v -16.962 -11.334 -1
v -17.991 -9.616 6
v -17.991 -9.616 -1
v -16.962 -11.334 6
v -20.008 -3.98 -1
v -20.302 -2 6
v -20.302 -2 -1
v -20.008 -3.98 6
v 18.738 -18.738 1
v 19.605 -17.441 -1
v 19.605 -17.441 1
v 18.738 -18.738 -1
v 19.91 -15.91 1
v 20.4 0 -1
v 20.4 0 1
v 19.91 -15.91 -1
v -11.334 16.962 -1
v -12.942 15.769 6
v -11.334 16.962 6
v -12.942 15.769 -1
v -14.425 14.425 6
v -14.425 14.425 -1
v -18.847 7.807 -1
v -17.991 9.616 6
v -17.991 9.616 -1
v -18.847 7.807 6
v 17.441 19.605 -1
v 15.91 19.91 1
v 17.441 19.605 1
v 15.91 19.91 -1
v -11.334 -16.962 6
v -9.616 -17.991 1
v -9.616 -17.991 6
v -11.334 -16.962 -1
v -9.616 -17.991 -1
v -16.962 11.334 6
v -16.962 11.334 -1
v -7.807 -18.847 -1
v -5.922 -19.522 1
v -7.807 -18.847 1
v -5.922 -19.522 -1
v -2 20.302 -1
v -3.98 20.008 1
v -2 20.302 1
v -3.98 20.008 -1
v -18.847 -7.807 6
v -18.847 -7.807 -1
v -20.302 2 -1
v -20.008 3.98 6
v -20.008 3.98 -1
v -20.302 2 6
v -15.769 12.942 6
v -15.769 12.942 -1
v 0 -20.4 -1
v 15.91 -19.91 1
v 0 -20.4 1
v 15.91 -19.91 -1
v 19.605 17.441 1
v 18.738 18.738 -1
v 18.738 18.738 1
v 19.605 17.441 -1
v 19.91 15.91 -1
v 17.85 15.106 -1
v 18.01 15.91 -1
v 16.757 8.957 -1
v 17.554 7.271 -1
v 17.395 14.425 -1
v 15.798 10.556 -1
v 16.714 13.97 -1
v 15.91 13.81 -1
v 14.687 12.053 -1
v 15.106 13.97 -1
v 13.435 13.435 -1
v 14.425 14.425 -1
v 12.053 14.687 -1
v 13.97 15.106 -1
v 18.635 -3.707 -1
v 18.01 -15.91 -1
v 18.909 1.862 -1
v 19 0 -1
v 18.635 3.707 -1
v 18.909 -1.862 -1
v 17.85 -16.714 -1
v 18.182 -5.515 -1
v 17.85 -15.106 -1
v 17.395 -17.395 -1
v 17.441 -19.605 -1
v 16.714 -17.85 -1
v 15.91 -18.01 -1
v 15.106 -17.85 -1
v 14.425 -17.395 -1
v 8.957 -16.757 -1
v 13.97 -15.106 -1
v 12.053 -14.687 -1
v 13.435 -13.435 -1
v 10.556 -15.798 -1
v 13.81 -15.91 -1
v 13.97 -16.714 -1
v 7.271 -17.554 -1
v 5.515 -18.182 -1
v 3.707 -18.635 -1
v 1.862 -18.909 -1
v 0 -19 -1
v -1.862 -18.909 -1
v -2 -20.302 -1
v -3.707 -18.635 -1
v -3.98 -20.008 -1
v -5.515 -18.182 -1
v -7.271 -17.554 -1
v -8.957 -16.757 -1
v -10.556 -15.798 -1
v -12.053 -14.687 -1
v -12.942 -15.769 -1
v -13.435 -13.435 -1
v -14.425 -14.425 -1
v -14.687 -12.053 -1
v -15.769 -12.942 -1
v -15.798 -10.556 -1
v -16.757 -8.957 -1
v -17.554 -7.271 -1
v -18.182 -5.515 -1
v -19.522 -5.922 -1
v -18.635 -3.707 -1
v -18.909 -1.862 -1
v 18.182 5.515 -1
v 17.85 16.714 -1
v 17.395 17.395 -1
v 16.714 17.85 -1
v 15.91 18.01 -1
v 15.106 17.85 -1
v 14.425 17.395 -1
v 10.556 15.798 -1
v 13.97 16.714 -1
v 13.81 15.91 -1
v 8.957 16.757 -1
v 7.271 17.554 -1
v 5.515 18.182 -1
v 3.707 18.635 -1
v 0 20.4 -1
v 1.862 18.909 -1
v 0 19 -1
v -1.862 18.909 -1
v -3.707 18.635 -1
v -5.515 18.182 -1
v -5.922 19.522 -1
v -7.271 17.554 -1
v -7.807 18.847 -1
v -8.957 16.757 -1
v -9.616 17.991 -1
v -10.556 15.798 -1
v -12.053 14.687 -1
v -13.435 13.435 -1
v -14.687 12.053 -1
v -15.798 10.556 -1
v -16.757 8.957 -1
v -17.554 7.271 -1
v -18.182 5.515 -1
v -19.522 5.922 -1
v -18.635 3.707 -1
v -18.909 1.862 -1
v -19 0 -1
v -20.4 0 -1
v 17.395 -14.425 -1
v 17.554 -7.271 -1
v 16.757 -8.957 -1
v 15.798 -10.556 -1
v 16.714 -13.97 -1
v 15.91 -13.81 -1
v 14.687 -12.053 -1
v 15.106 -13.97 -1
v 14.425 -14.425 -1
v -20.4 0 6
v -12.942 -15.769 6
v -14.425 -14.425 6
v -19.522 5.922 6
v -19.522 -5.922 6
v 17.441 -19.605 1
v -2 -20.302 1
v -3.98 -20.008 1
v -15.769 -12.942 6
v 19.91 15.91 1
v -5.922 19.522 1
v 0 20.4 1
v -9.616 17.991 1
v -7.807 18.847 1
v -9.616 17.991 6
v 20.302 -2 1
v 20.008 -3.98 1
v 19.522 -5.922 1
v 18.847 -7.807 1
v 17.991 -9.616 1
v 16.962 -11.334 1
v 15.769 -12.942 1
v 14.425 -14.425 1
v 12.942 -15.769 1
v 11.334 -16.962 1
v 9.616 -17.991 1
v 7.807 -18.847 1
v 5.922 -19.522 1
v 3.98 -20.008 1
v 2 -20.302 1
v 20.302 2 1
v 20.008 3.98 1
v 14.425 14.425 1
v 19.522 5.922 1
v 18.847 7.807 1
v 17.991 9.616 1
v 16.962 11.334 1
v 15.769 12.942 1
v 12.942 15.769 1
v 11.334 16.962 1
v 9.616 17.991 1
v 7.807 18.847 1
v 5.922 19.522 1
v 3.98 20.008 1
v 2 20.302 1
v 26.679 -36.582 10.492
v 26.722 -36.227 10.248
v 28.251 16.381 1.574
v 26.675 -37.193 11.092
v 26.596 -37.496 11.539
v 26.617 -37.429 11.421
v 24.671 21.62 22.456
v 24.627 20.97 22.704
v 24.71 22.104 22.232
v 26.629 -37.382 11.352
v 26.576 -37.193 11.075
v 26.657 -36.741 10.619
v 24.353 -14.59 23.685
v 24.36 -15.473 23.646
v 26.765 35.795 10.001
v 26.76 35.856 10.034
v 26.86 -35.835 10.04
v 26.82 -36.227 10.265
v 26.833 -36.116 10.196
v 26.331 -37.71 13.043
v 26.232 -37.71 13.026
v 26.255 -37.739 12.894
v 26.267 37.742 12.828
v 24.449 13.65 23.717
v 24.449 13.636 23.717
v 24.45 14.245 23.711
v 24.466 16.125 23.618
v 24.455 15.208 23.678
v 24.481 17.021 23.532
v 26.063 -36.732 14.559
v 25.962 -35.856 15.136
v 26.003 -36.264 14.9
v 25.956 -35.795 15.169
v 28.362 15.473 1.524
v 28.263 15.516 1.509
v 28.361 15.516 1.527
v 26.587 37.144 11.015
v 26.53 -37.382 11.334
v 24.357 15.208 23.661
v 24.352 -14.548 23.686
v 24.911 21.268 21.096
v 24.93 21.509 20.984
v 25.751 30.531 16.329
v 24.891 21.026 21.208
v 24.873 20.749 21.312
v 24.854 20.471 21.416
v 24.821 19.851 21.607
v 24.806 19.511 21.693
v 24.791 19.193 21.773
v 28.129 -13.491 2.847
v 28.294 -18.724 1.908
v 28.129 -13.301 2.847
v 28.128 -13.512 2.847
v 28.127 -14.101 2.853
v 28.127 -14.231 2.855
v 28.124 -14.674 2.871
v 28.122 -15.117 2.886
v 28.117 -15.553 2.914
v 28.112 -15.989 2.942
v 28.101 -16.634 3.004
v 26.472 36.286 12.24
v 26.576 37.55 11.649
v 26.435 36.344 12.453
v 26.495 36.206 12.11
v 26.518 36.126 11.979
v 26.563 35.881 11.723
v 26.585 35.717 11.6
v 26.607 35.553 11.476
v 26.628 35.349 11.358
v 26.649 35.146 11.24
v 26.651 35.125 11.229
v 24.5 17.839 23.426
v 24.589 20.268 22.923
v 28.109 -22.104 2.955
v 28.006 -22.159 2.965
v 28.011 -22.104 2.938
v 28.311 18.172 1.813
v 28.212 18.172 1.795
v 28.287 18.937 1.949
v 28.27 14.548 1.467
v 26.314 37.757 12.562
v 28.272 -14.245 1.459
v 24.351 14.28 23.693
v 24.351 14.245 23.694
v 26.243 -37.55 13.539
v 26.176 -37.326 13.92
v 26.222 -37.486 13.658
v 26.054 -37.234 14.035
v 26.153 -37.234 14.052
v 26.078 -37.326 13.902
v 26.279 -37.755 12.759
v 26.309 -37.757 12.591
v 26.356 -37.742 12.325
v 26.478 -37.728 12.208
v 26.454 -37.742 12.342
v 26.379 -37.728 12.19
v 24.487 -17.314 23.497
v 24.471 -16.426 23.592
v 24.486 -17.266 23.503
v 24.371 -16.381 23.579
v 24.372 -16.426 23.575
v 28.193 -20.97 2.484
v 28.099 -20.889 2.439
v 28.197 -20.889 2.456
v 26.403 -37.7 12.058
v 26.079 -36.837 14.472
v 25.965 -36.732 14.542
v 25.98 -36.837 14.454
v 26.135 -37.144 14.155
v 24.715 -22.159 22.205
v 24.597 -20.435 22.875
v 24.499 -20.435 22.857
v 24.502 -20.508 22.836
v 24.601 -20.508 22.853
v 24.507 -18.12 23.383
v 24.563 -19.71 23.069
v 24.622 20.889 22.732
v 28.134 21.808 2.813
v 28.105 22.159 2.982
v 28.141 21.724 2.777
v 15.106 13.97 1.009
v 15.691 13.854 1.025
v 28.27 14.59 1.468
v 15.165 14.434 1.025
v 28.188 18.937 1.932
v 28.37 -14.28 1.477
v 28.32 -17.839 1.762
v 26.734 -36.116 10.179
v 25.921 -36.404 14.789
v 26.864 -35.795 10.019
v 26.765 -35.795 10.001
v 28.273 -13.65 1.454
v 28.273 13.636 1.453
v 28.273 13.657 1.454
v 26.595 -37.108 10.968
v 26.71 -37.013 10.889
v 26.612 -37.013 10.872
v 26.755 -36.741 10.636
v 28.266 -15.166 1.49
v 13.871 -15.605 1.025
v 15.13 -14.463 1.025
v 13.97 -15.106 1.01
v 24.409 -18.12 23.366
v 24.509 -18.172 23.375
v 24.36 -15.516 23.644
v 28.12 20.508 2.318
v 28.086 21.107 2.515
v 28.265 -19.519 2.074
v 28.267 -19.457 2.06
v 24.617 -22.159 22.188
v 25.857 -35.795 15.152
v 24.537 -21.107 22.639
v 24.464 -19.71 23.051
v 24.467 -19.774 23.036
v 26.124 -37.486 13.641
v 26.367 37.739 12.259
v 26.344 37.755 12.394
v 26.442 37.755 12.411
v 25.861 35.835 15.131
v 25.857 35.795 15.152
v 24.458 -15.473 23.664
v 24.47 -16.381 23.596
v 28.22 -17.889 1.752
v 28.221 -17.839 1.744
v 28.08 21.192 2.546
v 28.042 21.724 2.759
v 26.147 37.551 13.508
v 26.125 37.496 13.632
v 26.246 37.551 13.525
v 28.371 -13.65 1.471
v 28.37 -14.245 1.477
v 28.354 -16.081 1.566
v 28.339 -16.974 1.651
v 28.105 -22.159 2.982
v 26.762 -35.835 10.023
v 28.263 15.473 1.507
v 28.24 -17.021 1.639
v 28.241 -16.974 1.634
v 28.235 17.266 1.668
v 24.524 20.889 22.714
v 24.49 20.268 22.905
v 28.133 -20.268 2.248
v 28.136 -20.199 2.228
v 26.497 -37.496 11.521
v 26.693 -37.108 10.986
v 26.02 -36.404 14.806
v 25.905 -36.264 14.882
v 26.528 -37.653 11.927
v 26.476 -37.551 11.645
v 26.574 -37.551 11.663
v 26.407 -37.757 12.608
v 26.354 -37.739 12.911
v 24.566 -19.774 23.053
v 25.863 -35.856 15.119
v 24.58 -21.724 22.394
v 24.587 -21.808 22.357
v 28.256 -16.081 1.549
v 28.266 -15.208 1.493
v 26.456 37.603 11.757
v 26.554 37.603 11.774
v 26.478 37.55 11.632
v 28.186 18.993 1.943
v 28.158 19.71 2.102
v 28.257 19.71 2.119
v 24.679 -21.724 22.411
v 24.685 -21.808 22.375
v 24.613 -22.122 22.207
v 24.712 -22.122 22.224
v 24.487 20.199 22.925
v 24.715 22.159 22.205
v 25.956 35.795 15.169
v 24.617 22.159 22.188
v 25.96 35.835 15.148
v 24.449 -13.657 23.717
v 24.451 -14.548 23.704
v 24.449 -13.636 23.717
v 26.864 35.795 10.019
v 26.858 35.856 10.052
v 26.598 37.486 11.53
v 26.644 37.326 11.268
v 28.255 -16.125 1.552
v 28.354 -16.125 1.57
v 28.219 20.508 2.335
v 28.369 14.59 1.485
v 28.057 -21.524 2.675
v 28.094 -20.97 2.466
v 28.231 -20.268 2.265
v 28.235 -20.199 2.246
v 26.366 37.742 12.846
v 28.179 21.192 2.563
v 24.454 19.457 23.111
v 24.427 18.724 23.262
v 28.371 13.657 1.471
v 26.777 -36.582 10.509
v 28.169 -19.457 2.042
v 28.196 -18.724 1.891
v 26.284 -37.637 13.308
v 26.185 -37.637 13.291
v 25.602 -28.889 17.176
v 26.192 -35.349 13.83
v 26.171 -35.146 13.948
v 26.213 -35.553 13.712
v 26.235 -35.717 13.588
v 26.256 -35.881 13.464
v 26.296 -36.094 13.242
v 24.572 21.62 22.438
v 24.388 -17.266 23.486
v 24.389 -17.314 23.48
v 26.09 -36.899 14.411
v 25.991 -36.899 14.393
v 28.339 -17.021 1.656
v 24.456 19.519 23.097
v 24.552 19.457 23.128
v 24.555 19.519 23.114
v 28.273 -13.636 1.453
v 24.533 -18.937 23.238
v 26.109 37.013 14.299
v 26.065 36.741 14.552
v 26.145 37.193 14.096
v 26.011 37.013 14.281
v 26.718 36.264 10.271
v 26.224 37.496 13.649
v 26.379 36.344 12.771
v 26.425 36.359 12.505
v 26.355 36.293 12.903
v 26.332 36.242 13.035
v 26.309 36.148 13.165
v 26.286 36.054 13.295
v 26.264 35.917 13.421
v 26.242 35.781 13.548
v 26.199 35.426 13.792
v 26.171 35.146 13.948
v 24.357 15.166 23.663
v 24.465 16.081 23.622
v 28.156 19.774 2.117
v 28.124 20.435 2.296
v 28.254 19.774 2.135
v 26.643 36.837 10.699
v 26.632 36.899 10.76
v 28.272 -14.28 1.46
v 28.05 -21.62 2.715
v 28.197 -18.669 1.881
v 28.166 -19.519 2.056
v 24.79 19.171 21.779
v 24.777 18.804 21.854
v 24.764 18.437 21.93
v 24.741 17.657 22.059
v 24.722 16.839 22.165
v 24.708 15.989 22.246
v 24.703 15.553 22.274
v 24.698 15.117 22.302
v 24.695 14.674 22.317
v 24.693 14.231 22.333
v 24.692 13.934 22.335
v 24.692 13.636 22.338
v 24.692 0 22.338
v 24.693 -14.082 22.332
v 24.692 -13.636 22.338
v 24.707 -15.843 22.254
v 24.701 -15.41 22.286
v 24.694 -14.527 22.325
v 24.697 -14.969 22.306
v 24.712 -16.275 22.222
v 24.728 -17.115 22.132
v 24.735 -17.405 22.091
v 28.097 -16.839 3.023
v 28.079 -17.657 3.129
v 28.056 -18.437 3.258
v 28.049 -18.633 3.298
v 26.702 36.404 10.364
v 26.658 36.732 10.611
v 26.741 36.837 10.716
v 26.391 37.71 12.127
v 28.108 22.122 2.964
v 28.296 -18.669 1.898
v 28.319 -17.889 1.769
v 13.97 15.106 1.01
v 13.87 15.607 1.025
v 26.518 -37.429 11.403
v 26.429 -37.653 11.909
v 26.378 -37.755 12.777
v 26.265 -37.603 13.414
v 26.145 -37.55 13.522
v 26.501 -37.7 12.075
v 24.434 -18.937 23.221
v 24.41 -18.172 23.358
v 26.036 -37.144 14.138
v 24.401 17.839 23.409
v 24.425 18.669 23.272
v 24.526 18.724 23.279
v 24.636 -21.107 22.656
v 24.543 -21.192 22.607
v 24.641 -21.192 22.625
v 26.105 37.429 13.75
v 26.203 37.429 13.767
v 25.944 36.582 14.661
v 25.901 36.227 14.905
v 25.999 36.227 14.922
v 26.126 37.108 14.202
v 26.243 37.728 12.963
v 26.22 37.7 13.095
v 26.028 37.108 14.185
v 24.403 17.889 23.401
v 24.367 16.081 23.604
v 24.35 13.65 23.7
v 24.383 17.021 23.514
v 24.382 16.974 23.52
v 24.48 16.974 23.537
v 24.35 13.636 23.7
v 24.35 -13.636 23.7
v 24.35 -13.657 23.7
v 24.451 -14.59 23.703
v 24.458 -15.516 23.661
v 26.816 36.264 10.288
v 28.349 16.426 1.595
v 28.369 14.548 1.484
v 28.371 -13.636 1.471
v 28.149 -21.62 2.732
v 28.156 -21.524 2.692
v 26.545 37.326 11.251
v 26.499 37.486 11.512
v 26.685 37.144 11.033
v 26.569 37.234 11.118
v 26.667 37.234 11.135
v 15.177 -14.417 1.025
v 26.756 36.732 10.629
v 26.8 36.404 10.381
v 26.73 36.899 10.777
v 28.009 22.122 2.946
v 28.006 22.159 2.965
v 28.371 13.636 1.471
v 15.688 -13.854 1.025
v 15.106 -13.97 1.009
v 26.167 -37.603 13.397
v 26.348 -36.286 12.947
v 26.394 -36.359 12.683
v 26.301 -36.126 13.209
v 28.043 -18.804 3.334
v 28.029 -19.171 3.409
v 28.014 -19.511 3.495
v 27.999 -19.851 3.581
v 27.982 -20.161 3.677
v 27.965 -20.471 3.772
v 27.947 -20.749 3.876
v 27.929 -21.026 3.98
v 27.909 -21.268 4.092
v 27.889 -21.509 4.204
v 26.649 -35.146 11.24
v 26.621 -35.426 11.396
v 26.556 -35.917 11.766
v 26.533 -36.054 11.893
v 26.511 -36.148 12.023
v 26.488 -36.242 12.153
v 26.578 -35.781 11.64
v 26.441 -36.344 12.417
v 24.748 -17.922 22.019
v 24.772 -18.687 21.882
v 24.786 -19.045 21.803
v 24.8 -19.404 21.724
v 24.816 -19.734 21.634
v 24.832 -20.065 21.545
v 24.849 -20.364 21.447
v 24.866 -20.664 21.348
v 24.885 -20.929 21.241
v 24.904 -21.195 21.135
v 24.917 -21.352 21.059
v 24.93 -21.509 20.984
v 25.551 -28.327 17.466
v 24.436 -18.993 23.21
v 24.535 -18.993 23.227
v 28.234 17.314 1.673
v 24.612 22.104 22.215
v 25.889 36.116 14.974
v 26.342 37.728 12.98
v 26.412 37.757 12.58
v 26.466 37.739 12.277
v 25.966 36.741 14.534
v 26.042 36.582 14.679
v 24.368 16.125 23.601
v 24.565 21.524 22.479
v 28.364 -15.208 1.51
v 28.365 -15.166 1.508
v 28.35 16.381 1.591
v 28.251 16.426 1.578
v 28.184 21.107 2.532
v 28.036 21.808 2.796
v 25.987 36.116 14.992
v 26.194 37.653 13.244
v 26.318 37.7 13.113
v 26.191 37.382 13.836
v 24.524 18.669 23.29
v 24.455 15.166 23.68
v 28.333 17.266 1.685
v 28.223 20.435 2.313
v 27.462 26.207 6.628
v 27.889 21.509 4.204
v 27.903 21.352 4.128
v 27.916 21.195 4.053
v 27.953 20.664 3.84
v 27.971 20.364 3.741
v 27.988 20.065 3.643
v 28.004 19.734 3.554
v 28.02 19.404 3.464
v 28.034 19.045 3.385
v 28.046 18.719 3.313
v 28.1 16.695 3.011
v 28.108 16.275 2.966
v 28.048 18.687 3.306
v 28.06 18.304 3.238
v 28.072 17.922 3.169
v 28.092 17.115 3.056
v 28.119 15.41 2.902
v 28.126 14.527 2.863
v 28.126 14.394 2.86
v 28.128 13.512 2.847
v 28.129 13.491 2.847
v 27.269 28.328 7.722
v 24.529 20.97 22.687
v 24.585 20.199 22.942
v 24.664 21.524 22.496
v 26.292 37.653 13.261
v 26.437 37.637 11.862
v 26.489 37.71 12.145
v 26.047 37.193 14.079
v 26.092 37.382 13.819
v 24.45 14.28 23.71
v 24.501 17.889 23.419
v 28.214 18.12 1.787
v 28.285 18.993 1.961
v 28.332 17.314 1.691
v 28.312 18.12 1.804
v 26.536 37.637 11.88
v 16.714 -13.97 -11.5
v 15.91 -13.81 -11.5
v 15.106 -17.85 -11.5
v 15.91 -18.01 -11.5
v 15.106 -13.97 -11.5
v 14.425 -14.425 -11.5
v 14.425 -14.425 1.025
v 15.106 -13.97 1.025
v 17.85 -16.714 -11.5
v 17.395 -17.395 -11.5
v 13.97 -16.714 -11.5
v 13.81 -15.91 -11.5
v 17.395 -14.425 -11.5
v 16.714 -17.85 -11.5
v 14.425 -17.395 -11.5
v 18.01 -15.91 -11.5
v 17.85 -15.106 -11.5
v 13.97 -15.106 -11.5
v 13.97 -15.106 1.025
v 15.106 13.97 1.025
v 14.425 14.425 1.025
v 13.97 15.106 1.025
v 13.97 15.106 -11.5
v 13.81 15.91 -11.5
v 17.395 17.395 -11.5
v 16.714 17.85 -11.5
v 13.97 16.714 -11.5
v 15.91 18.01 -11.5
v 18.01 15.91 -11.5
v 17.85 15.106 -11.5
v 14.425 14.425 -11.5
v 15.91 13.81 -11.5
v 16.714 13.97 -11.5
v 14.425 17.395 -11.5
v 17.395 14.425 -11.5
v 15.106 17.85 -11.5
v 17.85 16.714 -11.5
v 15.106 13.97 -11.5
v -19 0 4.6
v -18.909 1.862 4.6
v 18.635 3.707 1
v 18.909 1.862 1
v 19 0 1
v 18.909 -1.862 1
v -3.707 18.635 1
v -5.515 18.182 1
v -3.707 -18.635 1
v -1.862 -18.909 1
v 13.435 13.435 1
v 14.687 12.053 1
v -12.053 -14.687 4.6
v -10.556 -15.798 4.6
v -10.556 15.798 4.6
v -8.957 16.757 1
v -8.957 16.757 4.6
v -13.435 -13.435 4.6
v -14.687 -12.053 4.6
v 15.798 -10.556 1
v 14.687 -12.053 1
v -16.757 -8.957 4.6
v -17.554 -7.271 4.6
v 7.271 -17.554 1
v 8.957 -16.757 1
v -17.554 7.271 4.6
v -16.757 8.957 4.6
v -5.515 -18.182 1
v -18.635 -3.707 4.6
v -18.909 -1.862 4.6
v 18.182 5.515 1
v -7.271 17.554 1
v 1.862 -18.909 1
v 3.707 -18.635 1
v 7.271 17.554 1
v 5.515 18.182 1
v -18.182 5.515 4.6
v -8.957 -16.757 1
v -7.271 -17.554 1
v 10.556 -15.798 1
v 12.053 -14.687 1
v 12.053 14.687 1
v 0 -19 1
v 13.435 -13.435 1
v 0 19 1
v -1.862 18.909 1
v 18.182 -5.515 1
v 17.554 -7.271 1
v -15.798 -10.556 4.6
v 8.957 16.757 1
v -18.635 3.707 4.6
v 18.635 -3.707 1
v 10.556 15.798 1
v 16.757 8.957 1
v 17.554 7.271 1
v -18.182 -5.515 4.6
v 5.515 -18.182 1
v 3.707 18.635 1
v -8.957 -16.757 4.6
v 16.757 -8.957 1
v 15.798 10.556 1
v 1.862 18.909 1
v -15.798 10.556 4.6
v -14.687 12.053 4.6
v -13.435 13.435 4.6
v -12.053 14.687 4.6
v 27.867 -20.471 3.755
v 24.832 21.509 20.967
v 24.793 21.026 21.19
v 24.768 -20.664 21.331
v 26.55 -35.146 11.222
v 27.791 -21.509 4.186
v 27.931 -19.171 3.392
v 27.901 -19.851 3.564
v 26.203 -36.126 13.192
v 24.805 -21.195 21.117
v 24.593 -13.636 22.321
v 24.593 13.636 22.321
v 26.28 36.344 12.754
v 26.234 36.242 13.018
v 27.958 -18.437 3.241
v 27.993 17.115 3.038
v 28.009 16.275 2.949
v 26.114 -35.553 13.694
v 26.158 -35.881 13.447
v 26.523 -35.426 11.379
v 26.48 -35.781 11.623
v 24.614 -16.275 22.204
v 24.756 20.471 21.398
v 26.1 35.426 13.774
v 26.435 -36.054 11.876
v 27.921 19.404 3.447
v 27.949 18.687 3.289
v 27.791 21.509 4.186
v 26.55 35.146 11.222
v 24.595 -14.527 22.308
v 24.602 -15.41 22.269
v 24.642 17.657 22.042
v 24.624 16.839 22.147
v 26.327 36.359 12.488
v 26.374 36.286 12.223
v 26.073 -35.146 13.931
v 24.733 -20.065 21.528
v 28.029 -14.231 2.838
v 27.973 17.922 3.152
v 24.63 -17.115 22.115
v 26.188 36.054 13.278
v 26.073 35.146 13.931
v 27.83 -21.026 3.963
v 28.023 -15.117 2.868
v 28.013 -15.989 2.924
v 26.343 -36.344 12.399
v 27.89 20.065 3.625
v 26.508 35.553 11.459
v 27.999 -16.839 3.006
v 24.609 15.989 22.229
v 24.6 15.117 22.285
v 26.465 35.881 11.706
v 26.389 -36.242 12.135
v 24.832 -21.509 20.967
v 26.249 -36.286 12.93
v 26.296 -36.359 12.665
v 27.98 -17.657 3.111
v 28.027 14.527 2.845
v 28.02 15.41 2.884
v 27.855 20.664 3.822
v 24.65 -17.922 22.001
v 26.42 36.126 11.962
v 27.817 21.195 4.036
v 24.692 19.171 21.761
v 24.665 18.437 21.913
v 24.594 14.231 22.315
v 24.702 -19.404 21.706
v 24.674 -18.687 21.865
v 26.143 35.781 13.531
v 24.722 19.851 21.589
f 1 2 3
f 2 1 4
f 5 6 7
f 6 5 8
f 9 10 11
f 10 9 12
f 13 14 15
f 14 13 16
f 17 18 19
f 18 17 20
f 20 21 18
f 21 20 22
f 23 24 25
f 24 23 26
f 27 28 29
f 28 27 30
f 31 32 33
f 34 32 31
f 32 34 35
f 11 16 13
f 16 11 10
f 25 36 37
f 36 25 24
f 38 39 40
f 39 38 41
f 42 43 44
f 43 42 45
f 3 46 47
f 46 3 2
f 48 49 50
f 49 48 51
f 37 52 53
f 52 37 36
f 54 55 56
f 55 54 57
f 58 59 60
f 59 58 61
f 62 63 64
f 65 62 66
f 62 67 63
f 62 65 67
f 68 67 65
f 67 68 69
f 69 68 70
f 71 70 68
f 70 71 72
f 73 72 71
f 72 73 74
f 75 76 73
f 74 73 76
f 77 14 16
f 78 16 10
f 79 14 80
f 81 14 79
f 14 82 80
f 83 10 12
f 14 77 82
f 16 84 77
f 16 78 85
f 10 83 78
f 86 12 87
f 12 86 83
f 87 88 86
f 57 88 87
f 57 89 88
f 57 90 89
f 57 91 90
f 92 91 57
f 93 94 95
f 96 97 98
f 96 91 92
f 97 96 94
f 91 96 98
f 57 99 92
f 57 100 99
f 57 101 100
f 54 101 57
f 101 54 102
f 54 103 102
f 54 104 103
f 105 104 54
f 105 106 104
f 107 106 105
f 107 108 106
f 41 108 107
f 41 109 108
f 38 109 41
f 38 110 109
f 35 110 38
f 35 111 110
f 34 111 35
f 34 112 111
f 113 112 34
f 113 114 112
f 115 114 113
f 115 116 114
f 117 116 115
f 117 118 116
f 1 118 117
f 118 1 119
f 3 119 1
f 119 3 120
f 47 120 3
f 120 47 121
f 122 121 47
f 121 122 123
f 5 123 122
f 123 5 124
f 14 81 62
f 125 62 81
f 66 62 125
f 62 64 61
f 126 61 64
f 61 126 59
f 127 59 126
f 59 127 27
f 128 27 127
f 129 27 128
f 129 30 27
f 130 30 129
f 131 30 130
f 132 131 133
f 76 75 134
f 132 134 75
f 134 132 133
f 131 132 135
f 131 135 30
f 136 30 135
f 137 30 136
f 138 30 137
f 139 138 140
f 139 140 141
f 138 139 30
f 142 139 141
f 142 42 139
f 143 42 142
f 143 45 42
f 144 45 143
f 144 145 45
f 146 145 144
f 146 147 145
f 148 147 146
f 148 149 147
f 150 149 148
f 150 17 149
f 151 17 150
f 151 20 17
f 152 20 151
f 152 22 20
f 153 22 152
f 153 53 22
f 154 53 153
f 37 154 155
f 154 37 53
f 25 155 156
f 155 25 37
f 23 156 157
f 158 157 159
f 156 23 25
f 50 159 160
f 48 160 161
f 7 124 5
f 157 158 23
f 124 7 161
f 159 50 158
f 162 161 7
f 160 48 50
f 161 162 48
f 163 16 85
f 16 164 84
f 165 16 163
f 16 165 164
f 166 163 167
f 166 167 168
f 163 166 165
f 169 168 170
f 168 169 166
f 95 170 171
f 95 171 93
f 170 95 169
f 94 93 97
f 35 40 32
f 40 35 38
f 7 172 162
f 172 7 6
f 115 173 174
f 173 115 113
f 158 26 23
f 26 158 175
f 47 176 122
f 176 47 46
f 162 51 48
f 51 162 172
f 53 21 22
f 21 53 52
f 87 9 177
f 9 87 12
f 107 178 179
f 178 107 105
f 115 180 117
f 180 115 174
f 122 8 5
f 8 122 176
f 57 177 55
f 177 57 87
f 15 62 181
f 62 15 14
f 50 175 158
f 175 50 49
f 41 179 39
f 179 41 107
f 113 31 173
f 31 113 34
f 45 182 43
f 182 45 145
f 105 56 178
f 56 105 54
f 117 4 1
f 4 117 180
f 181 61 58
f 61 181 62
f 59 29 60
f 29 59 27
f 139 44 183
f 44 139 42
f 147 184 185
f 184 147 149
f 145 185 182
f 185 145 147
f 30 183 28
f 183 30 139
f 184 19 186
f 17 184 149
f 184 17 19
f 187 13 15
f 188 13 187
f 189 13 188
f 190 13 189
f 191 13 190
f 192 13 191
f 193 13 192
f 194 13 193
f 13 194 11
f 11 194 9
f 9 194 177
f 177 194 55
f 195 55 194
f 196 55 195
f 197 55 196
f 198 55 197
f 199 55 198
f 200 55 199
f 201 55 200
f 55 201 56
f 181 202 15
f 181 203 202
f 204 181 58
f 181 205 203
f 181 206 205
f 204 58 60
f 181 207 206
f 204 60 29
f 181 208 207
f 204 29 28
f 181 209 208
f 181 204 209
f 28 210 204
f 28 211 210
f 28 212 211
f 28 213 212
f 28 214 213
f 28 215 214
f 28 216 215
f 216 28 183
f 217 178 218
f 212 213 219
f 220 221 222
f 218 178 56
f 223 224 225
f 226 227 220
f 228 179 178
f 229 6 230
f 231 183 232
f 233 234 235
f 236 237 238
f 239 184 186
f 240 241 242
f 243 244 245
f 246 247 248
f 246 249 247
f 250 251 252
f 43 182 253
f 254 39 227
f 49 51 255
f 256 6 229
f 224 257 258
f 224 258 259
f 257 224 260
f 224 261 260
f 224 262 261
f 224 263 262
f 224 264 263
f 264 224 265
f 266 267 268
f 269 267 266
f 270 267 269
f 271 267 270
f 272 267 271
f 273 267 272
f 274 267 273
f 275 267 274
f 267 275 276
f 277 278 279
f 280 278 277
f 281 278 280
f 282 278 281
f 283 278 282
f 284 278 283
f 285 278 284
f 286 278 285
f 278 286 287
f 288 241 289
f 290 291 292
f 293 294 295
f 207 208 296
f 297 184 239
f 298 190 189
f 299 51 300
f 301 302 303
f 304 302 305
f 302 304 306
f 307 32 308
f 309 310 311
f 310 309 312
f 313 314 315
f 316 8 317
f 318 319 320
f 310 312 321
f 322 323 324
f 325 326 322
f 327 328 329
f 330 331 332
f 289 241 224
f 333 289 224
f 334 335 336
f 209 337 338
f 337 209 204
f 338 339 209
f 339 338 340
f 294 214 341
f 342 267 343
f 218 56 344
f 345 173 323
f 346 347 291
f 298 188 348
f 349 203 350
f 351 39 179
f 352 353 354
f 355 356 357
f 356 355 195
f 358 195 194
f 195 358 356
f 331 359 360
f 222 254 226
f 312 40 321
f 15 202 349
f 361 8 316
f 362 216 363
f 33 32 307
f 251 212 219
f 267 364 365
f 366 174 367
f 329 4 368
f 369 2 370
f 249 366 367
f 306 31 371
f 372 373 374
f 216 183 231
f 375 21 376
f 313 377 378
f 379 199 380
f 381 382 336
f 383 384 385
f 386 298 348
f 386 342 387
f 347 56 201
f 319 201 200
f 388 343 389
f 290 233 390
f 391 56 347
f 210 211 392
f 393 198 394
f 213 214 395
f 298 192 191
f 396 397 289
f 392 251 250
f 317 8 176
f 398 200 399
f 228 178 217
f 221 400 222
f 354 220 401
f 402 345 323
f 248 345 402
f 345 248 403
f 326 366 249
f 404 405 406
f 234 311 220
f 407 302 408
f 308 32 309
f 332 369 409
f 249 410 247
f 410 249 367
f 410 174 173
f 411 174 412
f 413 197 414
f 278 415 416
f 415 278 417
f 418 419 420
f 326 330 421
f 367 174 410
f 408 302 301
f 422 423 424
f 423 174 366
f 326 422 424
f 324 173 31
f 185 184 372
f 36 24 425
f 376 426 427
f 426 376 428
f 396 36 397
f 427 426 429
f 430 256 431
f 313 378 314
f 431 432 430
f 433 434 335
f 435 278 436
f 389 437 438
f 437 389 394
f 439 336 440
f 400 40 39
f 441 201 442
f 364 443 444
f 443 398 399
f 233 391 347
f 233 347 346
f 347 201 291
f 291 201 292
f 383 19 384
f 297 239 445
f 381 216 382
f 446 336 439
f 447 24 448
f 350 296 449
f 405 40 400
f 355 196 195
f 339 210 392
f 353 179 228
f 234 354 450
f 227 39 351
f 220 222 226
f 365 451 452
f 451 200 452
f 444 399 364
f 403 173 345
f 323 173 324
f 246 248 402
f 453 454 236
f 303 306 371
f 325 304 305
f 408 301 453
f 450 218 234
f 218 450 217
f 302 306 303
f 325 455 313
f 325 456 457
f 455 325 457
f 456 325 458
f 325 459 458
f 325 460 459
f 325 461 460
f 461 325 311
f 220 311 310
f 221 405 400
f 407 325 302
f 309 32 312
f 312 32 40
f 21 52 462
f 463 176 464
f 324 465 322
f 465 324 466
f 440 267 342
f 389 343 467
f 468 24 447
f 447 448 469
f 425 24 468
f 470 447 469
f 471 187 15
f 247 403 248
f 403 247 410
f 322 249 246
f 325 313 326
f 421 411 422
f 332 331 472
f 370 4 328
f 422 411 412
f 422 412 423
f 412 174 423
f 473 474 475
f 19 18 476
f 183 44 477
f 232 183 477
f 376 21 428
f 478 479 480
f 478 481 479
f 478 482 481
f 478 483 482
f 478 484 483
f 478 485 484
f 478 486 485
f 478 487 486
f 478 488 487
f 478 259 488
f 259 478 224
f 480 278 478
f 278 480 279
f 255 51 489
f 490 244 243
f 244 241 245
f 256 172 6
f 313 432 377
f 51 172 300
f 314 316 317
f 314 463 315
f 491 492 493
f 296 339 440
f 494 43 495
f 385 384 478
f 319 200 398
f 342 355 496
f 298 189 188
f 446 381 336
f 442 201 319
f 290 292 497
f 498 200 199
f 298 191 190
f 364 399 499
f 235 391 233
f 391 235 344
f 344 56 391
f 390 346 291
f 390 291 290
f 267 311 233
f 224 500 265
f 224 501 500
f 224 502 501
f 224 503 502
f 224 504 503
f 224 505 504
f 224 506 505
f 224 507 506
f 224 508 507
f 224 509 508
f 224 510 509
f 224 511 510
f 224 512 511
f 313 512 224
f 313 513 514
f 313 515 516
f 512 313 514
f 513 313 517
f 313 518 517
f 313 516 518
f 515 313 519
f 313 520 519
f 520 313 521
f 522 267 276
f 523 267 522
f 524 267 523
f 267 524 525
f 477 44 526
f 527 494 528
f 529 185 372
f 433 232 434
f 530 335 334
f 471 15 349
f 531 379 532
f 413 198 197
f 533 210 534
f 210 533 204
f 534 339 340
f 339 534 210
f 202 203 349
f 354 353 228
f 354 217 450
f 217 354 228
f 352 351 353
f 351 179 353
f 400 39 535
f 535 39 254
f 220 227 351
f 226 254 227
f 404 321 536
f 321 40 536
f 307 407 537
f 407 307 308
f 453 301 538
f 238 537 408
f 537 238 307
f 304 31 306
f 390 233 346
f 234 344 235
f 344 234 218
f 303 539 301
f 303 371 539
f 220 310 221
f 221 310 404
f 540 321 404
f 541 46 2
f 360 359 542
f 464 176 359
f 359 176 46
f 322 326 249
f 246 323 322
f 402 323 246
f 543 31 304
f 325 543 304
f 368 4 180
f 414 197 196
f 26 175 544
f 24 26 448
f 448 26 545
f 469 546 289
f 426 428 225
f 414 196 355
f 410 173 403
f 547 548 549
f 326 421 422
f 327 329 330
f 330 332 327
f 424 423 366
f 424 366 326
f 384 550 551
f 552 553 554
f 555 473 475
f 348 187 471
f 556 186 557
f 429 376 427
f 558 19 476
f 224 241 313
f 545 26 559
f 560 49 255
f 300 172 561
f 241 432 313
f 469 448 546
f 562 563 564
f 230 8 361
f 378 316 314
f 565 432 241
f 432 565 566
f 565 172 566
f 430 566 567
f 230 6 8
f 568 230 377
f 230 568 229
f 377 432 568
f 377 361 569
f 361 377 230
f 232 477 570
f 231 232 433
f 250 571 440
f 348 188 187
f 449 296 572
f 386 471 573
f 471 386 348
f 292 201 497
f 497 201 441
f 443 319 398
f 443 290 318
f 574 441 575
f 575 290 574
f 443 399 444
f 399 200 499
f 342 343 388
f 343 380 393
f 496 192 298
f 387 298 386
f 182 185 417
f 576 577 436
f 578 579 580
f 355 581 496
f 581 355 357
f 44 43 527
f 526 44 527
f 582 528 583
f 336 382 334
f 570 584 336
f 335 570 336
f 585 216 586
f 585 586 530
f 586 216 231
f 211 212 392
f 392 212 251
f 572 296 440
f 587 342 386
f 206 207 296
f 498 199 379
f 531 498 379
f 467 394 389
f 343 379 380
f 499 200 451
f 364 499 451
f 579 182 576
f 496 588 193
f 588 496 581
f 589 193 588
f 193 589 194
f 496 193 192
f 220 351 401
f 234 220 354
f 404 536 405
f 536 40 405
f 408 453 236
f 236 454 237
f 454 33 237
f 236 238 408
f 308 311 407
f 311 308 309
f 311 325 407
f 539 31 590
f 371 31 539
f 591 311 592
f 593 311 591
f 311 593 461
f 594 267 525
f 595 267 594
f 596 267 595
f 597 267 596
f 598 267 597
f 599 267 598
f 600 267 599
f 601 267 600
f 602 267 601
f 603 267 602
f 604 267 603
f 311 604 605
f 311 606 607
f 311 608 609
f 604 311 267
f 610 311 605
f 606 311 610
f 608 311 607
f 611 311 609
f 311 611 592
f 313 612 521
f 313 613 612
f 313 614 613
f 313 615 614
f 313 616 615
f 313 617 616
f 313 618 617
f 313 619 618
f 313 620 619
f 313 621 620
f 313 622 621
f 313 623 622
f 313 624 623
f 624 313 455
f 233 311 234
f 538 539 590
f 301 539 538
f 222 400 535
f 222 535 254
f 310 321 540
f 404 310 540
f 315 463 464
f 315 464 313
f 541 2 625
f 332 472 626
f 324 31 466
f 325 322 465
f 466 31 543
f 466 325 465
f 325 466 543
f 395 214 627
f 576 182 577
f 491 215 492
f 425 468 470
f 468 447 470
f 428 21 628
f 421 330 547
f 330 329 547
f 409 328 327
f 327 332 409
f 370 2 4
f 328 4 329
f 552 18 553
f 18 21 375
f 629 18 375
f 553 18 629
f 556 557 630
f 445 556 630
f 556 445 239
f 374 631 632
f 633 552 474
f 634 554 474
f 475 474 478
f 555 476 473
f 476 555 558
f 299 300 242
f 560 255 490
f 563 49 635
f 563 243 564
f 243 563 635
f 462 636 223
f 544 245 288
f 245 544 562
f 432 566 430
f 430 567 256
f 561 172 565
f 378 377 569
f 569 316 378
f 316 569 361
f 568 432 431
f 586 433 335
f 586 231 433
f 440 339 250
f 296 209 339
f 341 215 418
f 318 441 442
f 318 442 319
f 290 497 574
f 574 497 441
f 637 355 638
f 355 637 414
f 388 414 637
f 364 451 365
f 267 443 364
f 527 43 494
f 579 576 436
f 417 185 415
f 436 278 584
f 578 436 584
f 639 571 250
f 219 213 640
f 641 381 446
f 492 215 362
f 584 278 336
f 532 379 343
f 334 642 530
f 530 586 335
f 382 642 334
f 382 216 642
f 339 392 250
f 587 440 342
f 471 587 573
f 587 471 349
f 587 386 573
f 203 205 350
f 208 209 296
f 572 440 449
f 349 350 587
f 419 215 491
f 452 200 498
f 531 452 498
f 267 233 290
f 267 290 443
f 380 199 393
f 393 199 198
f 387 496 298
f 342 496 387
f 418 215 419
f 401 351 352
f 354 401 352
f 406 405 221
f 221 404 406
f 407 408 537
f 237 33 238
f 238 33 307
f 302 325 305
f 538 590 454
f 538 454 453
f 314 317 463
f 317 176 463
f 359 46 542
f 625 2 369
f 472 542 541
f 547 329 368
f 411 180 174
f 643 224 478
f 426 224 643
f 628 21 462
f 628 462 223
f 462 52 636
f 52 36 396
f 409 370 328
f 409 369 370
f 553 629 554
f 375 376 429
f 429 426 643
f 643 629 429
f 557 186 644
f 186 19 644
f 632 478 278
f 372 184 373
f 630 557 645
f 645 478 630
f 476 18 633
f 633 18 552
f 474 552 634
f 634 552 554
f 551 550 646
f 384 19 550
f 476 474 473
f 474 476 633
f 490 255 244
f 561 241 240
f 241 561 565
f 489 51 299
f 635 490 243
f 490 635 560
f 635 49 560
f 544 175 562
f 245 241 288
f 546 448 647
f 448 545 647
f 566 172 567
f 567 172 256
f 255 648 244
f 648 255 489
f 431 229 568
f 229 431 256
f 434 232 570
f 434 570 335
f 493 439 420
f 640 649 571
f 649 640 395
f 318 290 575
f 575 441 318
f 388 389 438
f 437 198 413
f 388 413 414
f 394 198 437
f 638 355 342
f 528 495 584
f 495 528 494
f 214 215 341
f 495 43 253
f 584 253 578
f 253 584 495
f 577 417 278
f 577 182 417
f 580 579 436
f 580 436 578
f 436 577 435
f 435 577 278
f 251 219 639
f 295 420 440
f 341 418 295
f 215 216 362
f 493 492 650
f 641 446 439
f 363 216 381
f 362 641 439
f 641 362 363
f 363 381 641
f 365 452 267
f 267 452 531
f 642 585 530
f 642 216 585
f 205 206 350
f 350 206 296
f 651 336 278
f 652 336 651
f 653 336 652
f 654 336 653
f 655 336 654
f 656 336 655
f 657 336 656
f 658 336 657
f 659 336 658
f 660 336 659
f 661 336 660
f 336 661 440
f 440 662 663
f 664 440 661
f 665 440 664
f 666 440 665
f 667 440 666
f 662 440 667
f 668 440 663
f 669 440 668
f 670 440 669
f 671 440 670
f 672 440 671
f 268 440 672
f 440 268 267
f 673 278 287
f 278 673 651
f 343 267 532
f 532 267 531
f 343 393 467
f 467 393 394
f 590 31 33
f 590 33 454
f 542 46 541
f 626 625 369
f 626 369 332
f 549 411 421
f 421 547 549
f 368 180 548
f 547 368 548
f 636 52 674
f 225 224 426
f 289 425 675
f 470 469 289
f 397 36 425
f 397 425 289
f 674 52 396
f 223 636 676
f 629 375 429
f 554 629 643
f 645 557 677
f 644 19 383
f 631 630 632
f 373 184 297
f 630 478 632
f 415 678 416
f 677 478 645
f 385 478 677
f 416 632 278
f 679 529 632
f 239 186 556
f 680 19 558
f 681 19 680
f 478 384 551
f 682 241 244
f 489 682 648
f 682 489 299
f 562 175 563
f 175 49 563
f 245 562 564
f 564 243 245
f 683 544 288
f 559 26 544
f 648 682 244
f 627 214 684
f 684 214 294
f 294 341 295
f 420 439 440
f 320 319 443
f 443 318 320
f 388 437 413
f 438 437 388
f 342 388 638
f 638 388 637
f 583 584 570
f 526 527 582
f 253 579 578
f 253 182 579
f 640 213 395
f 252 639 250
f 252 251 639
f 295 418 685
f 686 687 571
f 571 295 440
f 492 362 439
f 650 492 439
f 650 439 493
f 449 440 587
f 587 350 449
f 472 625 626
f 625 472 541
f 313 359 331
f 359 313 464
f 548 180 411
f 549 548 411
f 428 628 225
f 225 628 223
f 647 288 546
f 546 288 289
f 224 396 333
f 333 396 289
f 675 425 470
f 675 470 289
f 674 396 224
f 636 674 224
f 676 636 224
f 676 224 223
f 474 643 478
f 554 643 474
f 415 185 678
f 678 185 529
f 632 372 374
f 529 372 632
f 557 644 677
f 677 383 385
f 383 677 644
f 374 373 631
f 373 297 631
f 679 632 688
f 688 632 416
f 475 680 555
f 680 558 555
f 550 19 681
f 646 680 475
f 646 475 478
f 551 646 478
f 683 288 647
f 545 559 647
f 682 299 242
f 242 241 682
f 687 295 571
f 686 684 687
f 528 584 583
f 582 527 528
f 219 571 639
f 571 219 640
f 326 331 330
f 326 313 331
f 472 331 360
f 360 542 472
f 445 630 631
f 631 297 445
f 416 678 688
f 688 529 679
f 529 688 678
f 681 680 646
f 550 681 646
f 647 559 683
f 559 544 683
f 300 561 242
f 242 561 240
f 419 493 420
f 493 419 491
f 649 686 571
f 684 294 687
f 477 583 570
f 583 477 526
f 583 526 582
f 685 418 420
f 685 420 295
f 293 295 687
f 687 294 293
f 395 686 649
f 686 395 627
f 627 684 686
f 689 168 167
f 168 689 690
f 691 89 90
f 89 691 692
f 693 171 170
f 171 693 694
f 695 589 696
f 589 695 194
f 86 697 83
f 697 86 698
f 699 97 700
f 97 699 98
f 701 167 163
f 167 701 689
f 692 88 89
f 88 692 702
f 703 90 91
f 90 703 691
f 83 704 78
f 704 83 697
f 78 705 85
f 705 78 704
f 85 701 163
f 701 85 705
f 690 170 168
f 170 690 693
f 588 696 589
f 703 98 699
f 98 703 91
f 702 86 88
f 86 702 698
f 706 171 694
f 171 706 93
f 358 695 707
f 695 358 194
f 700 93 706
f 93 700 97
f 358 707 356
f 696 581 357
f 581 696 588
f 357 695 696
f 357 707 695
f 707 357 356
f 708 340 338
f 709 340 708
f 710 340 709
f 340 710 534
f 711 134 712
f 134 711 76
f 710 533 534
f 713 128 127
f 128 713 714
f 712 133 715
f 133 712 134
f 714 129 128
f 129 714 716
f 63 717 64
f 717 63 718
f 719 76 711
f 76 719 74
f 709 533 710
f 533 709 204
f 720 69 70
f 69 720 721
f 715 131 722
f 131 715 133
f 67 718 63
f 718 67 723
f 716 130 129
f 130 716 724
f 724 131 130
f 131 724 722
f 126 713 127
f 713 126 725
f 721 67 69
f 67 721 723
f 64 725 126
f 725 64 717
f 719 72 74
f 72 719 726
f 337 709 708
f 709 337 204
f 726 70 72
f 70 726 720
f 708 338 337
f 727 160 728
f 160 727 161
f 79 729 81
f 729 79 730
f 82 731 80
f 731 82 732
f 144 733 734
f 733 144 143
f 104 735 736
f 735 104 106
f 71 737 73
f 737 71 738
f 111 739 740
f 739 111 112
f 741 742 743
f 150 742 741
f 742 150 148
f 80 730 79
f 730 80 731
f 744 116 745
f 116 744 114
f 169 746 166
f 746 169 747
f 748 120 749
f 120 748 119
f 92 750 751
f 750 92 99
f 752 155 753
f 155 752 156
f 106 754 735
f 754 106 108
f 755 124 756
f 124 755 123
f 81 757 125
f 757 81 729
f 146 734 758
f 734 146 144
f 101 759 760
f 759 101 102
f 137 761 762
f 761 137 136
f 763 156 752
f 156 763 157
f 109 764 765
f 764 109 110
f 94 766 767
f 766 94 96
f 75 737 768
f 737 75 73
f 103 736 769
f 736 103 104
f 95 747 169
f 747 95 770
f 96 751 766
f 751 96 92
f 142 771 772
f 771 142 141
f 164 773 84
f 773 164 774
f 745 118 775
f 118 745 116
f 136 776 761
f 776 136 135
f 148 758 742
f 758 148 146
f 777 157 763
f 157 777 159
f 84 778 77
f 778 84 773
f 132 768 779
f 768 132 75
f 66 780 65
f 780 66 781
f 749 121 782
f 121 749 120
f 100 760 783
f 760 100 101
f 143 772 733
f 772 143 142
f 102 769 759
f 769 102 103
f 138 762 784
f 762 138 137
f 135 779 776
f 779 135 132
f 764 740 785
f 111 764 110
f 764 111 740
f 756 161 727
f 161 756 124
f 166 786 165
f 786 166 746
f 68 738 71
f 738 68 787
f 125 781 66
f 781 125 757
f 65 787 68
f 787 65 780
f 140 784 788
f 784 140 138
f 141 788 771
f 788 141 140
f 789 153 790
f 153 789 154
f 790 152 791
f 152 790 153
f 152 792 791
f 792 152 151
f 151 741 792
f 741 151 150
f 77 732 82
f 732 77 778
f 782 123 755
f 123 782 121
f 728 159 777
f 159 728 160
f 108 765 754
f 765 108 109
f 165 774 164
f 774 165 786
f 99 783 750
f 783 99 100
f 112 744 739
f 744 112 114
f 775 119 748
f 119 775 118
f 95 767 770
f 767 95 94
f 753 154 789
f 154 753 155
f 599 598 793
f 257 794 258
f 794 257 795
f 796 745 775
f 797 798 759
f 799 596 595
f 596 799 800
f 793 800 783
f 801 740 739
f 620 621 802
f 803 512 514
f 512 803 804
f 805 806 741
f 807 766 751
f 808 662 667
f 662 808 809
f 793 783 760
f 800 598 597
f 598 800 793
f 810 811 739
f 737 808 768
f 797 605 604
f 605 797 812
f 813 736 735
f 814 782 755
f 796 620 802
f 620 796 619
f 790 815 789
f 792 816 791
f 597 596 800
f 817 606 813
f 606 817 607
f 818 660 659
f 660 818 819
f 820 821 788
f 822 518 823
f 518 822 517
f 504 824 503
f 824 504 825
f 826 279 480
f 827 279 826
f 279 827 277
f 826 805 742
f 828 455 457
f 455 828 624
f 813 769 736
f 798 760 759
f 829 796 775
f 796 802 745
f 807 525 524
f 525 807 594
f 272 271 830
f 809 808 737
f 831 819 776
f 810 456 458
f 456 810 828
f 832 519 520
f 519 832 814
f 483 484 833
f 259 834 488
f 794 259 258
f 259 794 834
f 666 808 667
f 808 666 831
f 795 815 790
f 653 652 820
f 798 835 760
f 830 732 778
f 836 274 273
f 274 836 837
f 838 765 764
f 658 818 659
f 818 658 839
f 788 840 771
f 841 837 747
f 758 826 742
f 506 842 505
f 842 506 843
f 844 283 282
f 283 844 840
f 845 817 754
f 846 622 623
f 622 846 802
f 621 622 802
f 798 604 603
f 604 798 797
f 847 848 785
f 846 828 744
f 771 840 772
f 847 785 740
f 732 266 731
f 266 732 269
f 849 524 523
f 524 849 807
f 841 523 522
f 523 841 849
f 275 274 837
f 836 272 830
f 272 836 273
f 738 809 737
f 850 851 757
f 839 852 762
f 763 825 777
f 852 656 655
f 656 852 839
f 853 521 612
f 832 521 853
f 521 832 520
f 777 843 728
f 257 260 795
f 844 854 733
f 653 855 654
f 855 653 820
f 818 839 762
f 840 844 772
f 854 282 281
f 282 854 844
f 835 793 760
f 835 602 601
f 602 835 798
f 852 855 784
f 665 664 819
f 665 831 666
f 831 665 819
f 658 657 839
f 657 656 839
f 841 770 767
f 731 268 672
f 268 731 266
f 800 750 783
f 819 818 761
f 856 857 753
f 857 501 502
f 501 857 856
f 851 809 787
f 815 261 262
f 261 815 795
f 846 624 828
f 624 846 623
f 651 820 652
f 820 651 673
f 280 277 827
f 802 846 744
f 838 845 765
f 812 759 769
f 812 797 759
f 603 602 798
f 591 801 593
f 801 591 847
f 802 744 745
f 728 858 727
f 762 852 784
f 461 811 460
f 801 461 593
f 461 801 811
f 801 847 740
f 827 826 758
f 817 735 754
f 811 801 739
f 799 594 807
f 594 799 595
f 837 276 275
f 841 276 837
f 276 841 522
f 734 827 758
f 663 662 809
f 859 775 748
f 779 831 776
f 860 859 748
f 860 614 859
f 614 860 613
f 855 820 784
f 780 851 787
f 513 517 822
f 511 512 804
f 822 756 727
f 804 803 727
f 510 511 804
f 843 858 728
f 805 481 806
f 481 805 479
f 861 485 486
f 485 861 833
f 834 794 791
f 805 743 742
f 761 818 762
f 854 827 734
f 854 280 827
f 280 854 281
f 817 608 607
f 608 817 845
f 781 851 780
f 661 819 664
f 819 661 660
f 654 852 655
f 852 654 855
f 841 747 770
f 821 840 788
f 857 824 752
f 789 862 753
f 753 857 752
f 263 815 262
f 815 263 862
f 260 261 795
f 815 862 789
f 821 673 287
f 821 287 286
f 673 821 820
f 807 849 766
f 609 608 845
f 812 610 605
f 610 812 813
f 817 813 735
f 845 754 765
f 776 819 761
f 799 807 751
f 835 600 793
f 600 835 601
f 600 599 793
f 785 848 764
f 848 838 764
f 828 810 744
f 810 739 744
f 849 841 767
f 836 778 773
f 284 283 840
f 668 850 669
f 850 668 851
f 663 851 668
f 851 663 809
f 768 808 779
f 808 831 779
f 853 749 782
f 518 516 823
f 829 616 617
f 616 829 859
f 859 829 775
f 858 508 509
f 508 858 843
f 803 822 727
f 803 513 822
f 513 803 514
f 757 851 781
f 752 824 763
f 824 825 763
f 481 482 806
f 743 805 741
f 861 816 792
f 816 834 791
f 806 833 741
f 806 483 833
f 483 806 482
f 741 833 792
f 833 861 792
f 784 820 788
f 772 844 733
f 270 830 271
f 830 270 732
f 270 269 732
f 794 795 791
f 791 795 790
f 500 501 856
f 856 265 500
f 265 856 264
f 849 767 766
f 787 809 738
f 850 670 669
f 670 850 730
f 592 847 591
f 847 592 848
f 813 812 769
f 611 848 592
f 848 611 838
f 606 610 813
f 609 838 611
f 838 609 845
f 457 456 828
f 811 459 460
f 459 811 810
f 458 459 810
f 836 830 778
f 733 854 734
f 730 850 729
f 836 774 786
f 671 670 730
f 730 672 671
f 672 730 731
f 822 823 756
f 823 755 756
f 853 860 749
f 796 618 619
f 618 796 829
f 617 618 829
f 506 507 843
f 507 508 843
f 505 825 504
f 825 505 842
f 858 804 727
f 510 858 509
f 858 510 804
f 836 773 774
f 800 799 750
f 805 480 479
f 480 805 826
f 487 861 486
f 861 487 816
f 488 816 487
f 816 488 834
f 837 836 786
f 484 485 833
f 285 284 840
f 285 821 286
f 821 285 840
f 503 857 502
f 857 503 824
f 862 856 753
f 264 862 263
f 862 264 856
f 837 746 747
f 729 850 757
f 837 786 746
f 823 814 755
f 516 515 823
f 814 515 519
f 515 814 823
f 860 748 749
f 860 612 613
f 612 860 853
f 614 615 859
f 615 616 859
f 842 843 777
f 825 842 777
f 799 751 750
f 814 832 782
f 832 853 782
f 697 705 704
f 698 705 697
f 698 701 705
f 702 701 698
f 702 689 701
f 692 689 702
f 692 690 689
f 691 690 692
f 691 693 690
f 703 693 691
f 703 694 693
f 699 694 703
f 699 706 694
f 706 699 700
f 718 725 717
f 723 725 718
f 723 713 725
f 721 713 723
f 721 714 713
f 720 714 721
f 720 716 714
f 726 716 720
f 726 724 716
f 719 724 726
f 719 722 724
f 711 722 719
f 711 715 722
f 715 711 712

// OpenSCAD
// Universal Nozzle/Duct Creator

// Dean Cording
// dean@cording.id.au


// Remixed from Customizable fan nozzle for 40mm fans
// by mx5
// http://www.thingiverse.com/thing:130917

/* [Nozzle] */
// Length of nozzle body length
nozzle_length = 28; // [300]

// Thickness of nozzle wall
nozzle_wall = 1.4; 

// Tilt angle of nozzle body
nozzle_tilt = 70; // [-90:90]

// Extension of nozzle base
nozzle_extension = 5; // [100]

/* [Output Hole] */
// Size of nozzle output hole
nozzle_dillation = 40;  // [0:300]

// Ratio of height/width of nozzle output hole
nozzle_scale = 0.55;  // [0:0.05:4]

// Number of sides/corners of nozzle output hole (>2)
nozzle_edges = 6; // [3,4,5,6,7,8,9,10] 

// Curvature of nozzle output hole corners
nozzle_edgeradius = 5;  // [0:20]

// Rotate nozzle output hole between flat or corner
nozzle_edgerotate = 1; // [0,1] 

// Tilt angle of nozzle output hole relative to nozzle body
nozzle_end_tilt = 10;  // [-90:90]

/* [Base] */
// Thickness of nozzle mounting base (0 = no base)
base_thickness = 2; // [10]

// Inner diameter of nozzle input
inlet_inner_diameter = 38;  // [1:300]

// Diameter of mounting holes/pins
mntholes_diameter = 4.2; // [0:10]

// Distance from centre of duct to centre of mounting holes/pins
mntholes_radius = 22.5;   // [0:400]

// Angles of mounting holes/pins around nozzle base
mntholes_angles = [-45,45 ]; 

// Length of optional mounting pins (0 for holes instead of pins)
pin_length = 10.5;  // [0:50]

/* [Hidden] */
$fn = 64;


*%translate([0,0,-11])
    import("40mm fan.stl");

module nozzle_outer_shape( r, h)
{
    linear_extrude(height=h)
        offset(r=nozzle_wall)
            scale( [ nozzle_scale, 1 / nozzle_scale, 1 ] )
                rotate( [ 0, 0, nozzle_edgerotate * (180 / nozzle_edges)] )
                    offset(r=nozzle_edgeradius)
                        circle(max(0.1,r-nozzle_edgeradius),$fn=nozzle_edges);

}


module nozzle_inner_shape(r, h)
{
    linear_extrude(height=h)
        scale( [ nozzle_scale, 1 / nozzle_scale, 1 ] )
            rotate( [ 0, 0, nozzle_edgerotate * (180 / nozzle_edges)] )
                offset(r=nozzle_edgeradius)
                    circle(max(0.1,r-nozzle_edgeradius),$fn=nozzle_edges);
}

difference() {
	union()	{
        // Base plate
        hull() {
            cylinder(d=inlet_inner_diameter+nozzle_wall*2,base_thickness,center=true);
            
            for ( a = mntholes_angles )
                rotate( [ 0, 0, a ] )
                    translate( [ mntholes_radius, 0, 0 ] )
                        cylinder( r = 4, h = base_thickness, center = true, $fn = 16 );
        }
        
        // Nozzle body
		hull() {
            translate([0,0,base_thickness/2])
                cylinder(d=inlet_inner_diameter+nozzle_wall*2, h = max(0.01,nozzle_extension));
            translate([0,0,(nozzle_extension+base_thickness/2)/2])
                rotate( [ 0, nozzle_tilt, 0 ] )
                    translate( [ 0, 0, nozzle_length ] )
                        rotate([0,nozzle_end_tilt,0])
                            nozzle_outer_shape( r = nozzle_dillation/2, h = 0.1);
		}
        
	}
    
    // Inlet hole
    cylinder(d=inlet_inner_diameter,h=base_thickness+0.1,center=true);

    // Mounting holes
	for ( a = mntholes_angles )
		rotate( [ 0, 0, a ] )
			translate( [ mntholes_radius, 0, 0 ] )
				cylinder( d = mntholes_diameter, h = base_thickness+0.05, center = true, $fn = 16 );

    // Nozzle interior
	hull(){
        translate([0,0,base_thickness/2])
            cylinder( d = inlet_inner_diameter, h = max(0.01,(nozzle_extension - nozzle_wall)) );
        translate([0,0,(nozzle_extension+base_thickness/2)/2])
            rotate( [ 0, nozzle_tilt, 0 ] )
                translate( [ 0, 0, nozzle_length ] )
                  rotate([0,nozzle_end_tilt,0])
                    nozzle_inner_shape( r = nozzle_dillation/2, h = 0.2 ); 
	}
}

// Mounting Pins
if (pin_length > 0 && base_thickness > 0) {
	for ( a = mntholes_angles )
		rotate( [ 0, 0, a ] )
			translate( [ mntholes_radius, 0, -pin_length/2 ] )
				cylinder( d = mntholes_diameter, h = base_thickness+pin_length, center = true, $fn = 16 );

}
